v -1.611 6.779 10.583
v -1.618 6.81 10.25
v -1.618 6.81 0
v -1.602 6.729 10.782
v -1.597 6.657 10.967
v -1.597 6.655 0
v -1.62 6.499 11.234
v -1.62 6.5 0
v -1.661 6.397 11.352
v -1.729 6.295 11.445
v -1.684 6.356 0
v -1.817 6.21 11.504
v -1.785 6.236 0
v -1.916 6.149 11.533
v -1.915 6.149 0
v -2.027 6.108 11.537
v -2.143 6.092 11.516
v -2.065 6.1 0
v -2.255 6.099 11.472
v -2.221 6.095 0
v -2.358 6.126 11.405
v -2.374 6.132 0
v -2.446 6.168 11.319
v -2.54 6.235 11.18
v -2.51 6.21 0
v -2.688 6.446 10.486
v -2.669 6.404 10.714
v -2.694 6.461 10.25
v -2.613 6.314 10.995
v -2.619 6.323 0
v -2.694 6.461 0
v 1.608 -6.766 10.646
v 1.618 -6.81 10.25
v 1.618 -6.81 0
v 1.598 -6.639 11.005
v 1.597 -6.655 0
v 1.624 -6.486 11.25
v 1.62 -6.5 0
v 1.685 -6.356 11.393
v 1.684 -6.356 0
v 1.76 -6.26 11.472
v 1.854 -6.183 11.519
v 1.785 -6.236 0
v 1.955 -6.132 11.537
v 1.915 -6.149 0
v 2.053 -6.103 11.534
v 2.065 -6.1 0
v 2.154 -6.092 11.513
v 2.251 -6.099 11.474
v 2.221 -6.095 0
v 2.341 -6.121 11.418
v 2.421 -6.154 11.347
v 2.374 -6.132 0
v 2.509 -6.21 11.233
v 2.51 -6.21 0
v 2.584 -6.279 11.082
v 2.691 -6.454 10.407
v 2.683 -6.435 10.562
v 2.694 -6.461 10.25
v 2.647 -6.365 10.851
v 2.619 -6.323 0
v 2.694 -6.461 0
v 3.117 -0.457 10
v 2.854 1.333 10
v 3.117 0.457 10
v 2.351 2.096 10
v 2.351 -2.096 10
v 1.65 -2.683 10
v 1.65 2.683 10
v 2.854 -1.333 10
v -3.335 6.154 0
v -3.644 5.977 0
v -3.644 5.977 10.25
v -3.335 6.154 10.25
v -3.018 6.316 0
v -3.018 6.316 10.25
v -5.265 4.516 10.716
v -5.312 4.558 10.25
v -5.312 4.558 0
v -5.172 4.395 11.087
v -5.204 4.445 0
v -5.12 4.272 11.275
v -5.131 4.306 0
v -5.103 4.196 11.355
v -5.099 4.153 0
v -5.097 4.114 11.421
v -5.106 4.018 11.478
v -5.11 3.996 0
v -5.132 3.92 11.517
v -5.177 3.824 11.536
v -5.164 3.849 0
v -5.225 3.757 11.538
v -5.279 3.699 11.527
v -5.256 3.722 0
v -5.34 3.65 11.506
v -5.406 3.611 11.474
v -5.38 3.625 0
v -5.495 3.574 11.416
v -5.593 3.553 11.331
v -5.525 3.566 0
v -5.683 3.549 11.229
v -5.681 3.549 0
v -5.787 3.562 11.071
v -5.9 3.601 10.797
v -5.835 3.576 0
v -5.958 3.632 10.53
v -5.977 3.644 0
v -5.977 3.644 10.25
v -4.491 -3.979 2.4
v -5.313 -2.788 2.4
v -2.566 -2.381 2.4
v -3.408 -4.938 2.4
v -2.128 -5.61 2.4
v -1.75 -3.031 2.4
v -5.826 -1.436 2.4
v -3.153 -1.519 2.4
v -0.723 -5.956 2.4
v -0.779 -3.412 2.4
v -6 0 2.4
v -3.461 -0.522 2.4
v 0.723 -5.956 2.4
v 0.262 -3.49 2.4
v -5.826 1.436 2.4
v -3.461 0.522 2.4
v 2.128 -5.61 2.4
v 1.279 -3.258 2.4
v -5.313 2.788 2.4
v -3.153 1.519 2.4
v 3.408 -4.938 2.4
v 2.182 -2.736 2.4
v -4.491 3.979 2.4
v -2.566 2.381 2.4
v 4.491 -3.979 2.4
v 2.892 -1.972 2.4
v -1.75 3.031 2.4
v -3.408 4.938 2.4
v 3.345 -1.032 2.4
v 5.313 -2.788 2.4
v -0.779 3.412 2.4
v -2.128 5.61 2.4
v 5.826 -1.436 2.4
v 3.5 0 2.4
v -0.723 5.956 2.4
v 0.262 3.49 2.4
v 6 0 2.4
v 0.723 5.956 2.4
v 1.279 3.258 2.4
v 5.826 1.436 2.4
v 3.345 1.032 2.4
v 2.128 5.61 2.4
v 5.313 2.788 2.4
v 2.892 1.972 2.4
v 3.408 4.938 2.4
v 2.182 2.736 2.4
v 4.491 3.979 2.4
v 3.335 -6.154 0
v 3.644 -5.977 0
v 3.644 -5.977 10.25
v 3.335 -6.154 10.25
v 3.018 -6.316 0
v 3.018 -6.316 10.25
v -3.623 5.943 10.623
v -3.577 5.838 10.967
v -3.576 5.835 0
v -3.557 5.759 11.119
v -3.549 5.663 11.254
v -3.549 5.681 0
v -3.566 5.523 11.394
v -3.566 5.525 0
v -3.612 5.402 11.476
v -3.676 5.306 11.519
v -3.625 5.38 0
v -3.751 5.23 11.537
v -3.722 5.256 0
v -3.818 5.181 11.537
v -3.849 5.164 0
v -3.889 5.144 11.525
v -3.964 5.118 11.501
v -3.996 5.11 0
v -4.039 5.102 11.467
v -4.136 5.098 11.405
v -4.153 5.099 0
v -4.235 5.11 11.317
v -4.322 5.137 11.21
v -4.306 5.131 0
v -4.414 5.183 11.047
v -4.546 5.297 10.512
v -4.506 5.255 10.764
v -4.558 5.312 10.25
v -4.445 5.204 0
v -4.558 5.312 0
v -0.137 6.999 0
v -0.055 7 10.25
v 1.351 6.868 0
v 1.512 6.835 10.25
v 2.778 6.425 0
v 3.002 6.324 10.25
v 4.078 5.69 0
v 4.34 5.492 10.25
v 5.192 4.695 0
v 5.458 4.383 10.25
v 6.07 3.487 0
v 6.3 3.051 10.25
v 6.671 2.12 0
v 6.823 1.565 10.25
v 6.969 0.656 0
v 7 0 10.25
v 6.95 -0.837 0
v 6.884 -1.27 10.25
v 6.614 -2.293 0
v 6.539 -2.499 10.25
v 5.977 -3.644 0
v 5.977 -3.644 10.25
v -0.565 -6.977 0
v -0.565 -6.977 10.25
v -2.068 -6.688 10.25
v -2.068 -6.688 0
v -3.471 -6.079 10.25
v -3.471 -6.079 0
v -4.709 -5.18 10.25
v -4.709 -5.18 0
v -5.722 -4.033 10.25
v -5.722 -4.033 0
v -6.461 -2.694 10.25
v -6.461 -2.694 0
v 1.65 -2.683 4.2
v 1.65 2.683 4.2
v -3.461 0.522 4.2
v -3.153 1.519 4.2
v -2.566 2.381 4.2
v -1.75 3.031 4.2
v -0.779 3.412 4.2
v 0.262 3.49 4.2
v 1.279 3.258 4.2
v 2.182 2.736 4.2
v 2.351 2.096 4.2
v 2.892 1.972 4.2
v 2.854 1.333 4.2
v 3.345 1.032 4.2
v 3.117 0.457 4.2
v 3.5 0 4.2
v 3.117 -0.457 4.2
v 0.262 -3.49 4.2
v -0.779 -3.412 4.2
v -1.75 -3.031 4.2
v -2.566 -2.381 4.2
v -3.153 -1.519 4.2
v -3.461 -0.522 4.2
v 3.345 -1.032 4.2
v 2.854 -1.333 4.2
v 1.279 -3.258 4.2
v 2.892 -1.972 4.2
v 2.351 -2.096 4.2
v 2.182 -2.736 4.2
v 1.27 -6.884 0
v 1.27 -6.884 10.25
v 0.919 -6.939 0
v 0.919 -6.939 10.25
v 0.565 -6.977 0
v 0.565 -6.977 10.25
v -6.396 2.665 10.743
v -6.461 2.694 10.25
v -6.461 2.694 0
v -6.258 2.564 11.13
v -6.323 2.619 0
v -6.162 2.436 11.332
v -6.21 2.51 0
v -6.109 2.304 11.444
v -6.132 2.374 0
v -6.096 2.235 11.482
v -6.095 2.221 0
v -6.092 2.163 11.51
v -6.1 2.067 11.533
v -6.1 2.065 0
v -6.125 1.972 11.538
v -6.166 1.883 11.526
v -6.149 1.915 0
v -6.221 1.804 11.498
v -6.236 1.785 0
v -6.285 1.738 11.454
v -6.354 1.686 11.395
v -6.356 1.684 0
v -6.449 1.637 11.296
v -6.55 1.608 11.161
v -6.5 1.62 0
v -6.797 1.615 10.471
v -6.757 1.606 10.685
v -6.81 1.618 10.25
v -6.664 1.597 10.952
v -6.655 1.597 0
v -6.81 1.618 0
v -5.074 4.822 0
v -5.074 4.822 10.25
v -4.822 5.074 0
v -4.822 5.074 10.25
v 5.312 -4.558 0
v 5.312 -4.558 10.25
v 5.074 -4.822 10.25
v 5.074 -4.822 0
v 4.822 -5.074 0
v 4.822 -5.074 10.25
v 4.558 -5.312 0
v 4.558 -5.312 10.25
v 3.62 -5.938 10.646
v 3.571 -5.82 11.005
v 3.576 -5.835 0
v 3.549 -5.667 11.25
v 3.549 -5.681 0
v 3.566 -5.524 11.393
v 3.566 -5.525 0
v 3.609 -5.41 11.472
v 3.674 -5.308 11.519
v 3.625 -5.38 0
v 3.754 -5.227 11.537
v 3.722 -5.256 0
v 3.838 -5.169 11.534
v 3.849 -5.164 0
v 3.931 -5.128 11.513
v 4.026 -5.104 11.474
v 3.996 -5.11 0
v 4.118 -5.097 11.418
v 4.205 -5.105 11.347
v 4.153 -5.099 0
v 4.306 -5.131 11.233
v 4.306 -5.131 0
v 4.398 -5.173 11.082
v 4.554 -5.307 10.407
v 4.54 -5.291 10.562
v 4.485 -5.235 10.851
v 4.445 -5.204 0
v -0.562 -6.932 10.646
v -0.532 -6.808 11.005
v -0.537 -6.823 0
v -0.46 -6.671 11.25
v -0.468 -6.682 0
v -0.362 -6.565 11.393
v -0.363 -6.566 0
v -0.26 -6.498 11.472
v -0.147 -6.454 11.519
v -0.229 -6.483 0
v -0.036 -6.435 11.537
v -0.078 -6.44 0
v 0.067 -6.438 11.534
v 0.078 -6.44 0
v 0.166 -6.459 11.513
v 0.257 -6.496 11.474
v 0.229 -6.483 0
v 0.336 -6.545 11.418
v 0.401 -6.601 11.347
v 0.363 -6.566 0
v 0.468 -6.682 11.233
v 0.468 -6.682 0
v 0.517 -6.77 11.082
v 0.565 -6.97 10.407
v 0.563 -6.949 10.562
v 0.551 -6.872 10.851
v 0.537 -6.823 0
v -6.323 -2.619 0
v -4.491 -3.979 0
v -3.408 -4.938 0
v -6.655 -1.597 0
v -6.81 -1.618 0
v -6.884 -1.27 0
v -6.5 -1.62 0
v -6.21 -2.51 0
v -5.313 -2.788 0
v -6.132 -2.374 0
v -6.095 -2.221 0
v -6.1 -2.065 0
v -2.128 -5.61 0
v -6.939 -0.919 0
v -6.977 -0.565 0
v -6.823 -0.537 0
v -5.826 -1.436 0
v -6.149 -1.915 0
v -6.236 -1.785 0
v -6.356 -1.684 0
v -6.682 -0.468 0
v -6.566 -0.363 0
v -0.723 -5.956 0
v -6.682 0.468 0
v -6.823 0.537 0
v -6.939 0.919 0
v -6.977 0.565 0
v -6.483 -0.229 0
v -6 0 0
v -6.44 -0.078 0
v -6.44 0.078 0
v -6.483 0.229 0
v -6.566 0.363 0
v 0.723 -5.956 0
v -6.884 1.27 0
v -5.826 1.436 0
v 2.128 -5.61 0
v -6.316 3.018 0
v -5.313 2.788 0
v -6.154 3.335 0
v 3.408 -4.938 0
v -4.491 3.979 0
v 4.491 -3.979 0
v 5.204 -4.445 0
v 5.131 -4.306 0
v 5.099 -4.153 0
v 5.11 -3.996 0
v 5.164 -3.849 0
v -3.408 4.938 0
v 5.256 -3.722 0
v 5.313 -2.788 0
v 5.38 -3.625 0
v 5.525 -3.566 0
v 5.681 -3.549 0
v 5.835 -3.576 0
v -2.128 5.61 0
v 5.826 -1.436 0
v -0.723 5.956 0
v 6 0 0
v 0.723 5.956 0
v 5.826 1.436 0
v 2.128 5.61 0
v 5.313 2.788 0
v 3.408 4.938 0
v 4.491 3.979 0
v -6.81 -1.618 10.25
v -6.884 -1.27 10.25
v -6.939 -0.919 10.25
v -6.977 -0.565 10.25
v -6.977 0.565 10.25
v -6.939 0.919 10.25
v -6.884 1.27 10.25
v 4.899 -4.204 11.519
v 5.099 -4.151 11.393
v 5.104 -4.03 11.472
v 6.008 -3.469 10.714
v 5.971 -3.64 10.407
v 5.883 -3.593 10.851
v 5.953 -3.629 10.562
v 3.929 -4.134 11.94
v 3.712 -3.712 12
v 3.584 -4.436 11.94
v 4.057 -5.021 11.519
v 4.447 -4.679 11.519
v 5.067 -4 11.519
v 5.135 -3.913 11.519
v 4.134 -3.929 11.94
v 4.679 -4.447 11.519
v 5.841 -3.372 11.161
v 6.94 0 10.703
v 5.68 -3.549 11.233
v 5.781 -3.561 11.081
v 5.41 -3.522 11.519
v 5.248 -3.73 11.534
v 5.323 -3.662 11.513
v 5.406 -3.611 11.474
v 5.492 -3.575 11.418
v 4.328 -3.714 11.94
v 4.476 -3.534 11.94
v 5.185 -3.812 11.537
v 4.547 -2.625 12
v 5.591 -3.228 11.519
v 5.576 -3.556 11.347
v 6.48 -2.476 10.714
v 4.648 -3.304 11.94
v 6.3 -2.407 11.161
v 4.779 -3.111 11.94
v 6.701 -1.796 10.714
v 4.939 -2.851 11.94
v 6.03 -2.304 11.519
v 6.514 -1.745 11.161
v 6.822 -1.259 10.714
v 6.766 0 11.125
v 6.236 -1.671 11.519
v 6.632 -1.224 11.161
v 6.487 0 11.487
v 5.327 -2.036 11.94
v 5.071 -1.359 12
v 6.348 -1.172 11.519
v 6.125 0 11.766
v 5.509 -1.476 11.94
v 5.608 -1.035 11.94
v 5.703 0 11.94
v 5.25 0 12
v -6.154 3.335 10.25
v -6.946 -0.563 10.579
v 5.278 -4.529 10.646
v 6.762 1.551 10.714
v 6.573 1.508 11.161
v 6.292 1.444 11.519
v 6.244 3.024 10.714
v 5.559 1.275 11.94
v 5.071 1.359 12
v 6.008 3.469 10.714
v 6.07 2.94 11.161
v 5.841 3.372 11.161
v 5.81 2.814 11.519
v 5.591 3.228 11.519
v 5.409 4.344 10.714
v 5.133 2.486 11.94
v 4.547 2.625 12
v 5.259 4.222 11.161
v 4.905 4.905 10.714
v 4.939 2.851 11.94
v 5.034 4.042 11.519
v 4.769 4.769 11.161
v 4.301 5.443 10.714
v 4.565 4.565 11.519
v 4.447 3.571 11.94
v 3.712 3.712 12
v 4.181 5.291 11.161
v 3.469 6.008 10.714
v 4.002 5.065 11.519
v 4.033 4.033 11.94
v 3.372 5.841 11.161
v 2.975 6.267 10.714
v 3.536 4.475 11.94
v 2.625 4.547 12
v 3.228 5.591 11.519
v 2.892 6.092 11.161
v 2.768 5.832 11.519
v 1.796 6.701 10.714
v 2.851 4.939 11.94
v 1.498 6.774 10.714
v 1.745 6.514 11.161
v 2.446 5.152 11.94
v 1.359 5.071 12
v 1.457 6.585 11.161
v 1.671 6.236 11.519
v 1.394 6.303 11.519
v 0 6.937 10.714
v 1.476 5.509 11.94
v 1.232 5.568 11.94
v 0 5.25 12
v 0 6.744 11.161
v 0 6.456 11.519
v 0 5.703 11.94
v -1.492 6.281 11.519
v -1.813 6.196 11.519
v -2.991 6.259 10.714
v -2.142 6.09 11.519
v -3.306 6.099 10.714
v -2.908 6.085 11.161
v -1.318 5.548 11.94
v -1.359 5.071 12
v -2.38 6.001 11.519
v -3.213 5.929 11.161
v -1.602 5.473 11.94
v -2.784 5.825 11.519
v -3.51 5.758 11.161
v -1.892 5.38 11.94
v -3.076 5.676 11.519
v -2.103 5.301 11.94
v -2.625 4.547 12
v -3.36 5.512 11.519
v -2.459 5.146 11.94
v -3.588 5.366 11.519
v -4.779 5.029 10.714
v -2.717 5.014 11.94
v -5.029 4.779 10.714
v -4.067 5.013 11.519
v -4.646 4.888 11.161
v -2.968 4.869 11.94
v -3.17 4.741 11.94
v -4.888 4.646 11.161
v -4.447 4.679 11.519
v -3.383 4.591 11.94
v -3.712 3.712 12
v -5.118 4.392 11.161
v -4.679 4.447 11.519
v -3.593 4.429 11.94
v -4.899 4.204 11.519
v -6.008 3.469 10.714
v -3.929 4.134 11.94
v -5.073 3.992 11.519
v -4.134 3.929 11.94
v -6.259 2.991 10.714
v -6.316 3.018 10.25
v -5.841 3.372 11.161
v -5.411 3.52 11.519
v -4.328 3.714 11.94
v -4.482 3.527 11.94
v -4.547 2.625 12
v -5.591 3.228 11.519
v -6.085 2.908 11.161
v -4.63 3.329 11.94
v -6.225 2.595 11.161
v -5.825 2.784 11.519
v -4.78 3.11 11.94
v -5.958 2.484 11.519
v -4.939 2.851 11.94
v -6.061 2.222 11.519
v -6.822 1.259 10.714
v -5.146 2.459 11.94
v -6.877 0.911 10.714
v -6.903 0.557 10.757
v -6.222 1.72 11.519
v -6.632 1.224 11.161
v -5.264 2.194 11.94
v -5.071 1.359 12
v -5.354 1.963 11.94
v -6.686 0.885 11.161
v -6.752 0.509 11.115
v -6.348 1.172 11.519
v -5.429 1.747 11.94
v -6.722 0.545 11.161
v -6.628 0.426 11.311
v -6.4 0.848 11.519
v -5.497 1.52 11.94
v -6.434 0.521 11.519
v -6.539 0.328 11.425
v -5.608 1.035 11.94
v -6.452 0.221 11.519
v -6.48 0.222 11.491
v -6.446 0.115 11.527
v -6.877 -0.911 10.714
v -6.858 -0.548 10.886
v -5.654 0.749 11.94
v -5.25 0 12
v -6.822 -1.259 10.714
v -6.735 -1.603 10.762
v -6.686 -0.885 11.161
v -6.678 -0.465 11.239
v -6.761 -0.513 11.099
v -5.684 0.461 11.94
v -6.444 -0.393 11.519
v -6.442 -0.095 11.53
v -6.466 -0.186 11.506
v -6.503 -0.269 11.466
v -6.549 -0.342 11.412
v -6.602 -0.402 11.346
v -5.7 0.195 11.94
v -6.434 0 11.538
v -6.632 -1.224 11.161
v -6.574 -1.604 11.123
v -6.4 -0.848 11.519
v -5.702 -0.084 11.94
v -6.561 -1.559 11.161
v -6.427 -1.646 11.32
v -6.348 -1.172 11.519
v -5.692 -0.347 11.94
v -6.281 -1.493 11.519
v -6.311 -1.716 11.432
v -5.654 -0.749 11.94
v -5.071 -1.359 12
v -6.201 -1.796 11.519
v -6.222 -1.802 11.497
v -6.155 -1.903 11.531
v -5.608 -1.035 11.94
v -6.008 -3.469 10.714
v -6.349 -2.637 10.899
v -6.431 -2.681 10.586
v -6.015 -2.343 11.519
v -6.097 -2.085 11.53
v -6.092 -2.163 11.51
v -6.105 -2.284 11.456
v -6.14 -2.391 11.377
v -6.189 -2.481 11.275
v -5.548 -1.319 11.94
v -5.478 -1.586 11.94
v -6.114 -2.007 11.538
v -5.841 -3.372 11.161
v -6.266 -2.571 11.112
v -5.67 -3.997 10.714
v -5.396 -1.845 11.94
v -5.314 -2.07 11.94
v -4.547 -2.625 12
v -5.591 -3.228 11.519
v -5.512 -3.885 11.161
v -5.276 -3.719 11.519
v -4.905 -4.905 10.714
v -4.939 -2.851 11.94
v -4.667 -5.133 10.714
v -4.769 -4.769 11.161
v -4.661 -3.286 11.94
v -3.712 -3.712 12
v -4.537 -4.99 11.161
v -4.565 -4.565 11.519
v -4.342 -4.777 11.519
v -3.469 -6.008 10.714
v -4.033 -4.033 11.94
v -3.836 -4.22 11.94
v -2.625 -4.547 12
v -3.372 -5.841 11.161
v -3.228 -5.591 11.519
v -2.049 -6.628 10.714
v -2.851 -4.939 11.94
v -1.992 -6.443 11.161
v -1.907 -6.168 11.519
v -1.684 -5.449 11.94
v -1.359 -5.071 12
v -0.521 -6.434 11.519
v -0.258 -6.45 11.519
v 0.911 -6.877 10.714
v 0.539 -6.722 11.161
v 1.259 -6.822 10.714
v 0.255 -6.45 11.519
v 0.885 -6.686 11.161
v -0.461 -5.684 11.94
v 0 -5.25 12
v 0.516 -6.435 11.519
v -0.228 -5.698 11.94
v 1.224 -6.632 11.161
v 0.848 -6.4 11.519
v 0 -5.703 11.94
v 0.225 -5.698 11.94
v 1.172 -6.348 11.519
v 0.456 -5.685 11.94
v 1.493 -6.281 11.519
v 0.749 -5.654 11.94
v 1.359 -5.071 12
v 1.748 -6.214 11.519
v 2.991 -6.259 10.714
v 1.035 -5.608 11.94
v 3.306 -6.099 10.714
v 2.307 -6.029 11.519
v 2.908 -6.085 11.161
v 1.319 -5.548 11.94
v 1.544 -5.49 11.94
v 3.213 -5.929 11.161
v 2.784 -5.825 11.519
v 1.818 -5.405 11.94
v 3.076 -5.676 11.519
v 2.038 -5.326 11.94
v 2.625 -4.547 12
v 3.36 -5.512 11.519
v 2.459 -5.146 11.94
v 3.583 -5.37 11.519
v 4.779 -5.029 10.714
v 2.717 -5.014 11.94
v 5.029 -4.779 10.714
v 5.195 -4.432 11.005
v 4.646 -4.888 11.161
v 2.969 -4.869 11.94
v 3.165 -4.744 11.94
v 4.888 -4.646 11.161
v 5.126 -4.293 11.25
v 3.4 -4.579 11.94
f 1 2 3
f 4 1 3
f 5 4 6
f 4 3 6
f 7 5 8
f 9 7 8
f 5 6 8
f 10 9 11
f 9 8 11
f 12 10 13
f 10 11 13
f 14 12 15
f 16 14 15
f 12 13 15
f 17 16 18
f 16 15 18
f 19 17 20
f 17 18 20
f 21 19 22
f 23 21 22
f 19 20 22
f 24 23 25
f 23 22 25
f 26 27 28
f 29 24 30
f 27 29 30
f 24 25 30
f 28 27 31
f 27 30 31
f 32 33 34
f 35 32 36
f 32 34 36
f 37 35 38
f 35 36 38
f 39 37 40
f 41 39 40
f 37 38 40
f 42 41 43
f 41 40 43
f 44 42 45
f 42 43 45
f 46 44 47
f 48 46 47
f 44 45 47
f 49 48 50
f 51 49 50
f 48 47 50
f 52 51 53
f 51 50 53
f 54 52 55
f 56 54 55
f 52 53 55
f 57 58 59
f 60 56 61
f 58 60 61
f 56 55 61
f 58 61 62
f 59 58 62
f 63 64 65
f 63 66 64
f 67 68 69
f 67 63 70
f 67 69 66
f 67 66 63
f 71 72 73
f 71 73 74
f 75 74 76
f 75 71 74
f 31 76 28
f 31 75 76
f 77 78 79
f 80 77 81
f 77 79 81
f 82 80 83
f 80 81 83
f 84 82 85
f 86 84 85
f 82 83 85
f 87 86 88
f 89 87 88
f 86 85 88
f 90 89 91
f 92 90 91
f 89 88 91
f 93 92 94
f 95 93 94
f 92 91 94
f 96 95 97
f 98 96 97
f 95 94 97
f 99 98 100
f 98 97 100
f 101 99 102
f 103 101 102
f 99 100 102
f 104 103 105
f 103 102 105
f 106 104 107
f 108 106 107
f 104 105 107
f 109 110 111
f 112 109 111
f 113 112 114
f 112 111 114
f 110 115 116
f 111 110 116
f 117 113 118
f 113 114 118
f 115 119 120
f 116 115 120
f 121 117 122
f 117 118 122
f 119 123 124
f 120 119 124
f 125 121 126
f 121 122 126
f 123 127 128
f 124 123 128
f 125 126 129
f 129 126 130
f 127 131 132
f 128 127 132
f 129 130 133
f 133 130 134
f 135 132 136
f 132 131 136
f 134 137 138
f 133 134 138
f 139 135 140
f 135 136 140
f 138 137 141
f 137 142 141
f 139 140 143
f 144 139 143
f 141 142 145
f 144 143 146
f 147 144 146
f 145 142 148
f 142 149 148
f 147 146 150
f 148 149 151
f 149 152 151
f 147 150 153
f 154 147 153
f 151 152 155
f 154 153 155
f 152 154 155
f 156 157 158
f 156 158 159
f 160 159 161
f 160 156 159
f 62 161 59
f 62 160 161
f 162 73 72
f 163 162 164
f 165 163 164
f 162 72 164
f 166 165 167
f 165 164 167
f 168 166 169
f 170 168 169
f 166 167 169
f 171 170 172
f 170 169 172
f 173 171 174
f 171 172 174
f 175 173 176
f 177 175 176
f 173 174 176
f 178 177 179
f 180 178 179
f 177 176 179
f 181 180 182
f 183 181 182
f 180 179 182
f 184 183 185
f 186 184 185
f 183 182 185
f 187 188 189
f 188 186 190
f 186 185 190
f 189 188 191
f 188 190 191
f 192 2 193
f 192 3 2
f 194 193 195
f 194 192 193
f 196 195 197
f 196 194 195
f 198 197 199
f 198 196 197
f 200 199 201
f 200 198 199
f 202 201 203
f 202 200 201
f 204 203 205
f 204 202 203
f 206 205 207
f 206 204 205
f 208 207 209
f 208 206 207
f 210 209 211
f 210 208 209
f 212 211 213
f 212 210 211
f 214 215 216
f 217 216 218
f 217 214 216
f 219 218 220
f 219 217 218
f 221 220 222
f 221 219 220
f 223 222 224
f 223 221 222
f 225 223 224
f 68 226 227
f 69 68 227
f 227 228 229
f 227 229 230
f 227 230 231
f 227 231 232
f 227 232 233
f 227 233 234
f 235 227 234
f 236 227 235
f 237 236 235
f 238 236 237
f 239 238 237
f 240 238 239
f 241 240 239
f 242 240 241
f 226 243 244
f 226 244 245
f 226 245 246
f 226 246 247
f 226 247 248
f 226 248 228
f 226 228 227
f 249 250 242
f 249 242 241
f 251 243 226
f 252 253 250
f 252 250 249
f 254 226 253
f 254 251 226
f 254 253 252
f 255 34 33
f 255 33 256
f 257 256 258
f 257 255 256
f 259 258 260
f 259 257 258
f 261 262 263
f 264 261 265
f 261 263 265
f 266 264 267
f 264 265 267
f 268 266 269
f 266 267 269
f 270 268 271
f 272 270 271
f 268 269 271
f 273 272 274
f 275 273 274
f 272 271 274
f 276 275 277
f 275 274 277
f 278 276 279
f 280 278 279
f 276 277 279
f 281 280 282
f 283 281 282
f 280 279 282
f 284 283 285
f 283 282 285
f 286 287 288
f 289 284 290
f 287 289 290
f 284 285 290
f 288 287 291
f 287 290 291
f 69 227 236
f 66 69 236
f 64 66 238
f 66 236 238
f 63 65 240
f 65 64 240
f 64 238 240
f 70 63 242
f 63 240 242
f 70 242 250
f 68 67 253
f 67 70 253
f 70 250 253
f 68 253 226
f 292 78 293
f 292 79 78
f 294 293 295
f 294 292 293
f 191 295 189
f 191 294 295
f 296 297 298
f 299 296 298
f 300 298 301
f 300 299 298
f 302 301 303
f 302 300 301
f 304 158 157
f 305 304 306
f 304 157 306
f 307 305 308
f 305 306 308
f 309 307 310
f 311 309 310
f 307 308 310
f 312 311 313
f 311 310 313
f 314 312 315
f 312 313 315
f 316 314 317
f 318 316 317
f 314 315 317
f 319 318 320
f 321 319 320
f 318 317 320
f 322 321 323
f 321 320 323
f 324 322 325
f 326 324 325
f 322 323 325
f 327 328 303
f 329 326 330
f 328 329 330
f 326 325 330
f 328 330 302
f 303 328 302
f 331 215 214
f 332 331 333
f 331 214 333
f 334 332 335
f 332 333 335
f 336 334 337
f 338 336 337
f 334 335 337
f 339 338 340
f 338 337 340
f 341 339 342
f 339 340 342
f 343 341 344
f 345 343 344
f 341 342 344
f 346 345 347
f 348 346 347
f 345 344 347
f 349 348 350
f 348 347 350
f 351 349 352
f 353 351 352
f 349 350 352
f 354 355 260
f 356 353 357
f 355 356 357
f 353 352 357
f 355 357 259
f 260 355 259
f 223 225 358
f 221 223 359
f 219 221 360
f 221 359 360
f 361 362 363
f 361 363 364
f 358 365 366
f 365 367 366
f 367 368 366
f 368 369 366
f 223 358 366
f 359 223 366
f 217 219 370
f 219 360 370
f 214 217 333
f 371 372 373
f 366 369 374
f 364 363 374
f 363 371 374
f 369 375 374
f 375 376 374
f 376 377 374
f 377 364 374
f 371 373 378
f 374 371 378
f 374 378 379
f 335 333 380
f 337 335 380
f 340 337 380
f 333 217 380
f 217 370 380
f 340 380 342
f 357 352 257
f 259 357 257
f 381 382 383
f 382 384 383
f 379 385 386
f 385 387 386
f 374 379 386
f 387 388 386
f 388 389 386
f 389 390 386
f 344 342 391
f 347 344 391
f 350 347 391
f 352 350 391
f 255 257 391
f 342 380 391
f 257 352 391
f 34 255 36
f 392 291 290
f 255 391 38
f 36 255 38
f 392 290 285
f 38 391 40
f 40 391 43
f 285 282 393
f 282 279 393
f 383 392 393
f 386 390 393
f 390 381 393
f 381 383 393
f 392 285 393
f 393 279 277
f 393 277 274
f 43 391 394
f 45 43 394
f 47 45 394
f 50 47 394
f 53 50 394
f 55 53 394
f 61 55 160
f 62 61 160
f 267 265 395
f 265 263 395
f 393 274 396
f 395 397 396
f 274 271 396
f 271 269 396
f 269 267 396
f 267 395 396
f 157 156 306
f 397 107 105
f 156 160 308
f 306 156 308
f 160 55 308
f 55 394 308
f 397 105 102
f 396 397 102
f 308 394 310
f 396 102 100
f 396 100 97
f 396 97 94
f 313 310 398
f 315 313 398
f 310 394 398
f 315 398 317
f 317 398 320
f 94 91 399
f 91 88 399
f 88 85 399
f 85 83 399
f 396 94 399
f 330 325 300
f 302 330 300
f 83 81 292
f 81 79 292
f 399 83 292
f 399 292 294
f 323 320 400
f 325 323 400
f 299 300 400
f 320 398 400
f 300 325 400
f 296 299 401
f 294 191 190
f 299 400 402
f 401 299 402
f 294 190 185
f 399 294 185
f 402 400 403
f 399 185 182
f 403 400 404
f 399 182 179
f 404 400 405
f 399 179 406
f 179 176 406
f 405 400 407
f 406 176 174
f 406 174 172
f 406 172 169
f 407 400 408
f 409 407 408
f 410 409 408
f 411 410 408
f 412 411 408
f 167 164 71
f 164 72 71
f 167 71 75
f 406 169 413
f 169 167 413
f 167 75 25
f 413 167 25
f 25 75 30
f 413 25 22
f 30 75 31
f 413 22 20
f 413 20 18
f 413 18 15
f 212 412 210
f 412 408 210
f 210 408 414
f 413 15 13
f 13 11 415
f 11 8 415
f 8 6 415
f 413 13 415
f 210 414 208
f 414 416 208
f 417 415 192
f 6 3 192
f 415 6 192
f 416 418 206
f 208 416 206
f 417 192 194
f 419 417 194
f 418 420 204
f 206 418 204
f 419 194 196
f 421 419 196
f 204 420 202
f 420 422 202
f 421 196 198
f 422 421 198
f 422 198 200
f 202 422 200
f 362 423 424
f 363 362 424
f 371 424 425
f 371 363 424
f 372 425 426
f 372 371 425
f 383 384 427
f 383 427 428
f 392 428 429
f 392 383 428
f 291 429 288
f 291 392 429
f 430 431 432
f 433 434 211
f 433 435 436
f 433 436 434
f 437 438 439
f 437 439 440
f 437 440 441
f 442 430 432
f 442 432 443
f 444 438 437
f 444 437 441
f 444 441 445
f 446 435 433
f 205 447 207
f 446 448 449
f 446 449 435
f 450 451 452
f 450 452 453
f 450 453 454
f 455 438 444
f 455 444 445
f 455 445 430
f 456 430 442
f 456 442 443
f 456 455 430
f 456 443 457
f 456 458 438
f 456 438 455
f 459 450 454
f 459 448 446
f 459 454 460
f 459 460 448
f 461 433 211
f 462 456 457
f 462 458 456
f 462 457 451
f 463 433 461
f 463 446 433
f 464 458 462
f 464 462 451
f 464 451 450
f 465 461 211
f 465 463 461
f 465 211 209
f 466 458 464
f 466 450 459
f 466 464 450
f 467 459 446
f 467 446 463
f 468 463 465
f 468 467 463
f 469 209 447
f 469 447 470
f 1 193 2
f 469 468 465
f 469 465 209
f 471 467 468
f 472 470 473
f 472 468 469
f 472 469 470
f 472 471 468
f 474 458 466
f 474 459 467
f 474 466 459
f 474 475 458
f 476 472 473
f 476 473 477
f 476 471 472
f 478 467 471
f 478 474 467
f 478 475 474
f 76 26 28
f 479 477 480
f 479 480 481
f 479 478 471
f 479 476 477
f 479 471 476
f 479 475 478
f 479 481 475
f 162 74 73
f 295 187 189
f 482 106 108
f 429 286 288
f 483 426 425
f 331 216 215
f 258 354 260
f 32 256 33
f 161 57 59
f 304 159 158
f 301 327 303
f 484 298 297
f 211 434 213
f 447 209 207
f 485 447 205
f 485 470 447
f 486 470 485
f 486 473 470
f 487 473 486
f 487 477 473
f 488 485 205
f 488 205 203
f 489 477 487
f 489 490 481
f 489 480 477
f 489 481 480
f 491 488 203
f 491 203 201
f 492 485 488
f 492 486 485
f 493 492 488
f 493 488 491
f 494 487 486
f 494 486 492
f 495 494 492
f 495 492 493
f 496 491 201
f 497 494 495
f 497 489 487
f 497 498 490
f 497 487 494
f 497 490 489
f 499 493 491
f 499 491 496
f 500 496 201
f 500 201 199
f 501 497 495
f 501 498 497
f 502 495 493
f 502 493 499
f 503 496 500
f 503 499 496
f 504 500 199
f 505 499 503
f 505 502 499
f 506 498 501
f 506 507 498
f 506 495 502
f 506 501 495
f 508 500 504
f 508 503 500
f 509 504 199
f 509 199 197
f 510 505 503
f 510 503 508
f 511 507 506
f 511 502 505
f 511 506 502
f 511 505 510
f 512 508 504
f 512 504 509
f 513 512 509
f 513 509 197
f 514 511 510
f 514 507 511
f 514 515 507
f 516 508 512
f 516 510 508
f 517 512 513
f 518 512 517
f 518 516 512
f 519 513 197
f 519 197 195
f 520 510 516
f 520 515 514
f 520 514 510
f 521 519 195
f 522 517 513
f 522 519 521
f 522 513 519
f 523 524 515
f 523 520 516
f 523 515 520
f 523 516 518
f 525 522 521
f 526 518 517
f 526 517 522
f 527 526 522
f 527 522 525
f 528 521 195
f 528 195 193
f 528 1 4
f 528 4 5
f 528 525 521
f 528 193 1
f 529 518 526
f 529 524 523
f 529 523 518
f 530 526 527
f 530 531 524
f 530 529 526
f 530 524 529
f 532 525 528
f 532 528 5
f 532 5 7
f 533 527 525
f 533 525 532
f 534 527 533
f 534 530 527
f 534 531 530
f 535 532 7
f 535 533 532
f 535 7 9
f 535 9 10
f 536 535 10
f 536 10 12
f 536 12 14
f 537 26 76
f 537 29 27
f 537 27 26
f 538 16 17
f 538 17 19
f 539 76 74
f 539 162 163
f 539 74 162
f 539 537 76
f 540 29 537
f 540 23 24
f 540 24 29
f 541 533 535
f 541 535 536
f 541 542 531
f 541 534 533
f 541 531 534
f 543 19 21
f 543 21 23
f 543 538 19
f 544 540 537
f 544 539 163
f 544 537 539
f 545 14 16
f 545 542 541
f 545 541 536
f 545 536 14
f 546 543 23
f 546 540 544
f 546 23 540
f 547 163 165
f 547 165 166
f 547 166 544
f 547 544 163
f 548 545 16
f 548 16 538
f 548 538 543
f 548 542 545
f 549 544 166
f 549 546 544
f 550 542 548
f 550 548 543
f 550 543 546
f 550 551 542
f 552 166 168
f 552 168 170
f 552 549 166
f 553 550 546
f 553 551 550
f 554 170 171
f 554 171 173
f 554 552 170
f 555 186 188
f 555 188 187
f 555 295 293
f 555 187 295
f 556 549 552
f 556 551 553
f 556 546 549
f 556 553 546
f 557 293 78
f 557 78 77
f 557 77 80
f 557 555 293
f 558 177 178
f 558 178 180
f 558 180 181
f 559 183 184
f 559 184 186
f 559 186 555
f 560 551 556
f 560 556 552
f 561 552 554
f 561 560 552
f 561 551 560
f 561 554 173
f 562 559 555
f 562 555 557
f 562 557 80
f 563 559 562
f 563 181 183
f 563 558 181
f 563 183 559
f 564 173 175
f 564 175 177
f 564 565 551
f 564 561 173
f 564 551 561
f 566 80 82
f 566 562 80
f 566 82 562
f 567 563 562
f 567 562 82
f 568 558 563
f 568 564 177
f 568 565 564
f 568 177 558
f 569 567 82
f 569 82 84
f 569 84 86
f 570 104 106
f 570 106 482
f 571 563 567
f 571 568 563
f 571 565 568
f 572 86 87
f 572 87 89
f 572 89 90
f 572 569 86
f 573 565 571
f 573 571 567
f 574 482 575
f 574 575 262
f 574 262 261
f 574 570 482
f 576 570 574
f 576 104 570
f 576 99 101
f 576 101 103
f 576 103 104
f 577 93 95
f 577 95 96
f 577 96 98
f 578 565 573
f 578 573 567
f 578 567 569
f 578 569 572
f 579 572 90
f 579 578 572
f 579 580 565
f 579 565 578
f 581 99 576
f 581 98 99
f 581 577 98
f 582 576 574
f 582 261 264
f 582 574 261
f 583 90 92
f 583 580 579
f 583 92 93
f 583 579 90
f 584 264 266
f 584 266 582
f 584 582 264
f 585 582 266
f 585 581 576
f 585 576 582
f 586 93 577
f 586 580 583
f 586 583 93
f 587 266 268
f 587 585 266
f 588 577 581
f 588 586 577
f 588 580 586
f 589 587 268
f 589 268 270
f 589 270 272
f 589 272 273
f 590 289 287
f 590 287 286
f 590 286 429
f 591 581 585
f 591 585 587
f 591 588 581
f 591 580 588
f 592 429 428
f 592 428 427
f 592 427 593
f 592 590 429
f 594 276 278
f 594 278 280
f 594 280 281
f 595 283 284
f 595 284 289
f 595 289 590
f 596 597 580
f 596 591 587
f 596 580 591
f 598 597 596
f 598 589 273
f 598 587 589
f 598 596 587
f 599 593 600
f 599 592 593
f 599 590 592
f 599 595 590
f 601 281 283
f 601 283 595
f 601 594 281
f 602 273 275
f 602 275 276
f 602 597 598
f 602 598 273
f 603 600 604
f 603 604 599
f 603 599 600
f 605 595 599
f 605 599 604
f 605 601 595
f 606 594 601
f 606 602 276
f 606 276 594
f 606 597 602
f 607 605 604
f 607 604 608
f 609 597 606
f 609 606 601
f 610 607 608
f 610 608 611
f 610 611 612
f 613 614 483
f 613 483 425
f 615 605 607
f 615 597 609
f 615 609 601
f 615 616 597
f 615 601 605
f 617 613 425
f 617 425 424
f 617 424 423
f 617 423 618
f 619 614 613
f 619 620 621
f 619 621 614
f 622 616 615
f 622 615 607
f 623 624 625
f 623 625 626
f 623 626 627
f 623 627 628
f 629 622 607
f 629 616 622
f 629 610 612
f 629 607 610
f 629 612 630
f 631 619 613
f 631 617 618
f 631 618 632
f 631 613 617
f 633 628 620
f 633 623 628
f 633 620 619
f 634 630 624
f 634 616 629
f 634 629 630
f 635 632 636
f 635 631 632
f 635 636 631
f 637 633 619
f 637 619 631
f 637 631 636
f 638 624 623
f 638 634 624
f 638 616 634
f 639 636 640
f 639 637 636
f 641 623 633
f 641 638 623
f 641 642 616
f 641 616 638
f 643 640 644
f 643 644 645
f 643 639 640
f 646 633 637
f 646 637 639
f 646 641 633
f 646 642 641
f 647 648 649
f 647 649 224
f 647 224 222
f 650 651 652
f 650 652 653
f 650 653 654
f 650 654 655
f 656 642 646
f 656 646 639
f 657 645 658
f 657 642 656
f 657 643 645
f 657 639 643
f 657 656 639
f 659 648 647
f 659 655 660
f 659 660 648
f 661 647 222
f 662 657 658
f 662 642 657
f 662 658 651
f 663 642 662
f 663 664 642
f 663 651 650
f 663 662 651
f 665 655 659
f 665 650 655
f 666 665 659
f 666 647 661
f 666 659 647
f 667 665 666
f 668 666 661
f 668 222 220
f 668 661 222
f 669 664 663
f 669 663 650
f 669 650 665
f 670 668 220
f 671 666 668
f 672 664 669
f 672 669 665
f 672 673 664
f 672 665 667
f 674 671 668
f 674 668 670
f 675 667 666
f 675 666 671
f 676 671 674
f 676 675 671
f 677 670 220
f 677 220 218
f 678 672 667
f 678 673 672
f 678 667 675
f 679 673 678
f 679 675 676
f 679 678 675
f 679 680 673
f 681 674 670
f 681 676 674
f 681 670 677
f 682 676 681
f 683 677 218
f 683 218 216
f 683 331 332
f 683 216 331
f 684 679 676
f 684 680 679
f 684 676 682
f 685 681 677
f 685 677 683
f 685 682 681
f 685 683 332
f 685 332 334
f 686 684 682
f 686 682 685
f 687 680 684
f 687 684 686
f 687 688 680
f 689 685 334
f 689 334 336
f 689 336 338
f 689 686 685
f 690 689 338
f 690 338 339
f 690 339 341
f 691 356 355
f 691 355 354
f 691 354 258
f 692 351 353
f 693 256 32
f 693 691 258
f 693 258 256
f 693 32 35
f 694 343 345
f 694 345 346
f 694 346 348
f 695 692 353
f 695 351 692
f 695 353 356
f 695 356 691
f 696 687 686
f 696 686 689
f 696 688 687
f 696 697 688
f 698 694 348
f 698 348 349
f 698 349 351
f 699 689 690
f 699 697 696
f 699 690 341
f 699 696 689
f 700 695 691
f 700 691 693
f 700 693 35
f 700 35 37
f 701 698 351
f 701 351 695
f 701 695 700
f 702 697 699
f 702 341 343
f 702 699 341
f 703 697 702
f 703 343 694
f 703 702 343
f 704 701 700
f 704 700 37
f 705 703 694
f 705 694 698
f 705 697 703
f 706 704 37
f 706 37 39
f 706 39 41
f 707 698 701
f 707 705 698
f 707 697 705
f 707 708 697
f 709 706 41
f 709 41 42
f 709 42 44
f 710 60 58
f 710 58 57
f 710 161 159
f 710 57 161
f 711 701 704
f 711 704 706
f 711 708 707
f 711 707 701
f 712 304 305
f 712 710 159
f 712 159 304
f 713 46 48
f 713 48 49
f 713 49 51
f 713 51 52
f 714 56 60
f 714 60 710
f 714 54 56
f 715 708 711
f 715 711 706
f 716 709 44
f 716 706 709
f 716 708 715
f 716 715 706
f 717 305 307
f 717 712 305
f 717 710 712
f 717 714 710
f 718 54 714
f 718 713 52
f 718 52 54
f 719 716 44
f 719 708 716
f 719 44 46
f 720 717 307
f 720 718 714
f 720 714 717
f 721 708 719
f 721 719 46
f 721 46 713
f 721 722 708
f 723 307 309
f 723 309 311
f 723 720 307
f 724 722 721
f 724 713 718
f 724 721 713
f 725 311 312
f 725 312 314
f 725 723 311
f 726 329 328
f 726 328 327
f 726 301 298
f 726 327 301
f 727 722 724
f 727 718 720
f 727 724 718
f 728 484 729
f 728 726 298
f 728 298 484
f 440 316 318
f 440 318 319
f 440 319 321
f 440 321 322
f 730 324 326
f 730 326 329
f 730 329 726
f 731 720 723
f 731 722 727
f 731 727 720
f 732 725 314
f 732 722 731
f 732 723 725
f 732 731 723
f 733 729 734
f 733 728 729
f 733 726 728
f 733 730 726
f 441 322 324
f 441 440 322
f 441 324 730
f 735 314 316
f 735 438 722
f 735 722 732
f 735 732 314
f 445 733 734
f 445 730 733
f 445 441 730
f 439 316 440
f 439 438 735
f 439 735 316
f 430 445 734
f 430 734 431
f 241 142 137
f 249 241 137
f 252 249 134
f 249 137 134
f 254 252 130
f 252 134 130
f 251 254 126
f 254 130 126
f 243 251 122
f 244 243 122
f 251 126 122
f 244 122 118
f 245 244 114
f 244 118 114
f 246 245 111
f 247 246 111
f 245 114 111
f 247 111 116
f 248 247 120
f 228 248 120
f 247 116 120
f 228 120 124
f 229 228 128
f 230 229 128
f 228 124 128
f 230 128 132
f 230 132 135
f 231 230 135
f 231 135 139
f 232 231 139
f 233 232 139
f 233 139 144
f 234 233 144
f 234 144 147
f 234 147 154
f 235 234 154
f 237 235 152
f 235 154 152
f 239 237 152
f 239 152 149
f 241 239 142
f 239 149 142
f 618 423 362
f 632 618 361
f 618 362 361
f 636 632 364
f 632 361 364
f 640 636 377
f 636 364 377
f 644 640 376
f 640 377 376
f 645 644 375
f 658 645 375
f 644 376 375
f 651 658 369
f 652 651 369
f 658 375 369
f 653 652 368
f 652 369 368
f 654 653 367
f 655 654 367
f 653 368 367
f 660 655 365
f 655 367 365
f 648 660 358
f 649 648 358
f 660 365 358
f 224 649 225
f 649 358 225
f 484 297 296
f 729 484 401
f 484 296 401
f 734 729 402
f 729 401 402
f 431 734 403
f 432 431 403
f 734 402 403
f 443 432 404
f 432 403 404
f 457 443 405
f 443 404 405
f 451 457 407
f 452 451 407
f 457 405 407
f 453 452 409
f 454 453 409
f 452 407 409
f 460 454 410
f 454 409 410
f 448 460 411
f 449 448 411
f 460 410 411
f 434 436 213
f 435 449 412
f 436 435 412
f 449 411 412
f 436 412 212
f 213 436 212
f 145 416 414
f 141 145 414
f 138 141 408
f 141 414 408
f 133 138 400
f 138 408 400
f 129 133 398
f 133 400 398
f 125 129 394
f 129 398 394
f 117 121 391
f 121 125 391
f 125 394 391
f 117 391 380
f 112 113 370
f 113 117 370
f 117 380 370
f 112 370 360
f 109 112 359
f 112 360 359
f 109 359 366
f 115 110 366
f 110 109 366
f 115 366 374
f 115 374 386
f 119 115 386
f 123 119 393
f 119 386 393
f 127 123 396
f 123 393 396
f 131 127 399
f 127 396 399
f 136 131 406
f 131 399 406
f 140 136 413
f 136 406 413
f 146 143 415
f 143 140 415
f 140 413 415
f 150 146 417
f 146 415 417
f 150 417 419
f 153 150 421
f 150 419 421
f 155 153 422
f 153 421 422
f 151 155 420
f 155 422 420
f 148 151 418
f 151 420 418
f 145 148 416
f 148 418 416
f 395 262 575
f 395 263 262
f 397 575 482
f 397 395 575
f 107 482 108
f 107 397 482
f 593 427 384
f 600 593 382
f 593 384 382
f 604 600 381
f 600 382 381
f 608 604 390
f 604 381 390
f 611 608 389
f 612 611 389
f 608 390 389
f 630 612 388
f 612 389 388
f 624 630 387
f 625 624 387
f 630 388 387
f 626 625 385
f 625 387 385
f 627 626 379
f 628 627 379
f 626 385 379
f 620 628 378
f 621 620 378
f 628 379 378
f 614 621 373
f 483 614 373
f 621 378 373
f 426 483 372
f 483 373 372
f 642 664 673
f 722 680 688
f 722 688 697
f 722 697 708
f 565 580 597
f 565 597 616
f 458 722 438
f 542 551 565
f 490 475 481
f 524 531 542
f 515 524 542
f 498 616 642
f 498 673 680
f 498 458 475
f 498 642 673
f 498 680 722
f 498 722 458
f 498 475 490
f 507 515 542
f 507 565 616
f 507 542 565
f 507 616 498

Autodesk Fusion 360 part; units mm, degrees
sketch "Sketch1" plane through (0, 0, 0) normal (0, 0, 1) x (1, 0, 0)
  circle A0 centre (0, 0) radius 7
  dimension "d1" = 14
extrude "Extrude1" add sketch "Sketch1" along normal blind 12
fillet "Fillet1" radius 1.75 1 edges at (-6.5263, -2.5313, 12)
sketch "Sketch2" plane through (0, 0, 0) normal (0, 0, -1) x (1, 0, 0)
  circle A0 centre (0, 0) radius 7
  circle A1 centre (0, 0) radius 7
  circle A2 centre (0, 0) radius 6
  circle A3 centre (0, 0) radius 7
  line L0 (0, 0) -> (0, 0.2) construction
  line L1 (0, 0.2) -> (0, 7) construction
  line L2 (0, 6) -> (0.65, 6) construction
  line L3 (0, 7) -> (0.6591, 6.9689) construction
  line L4 (0.65, 6) -> (0.65, 6.9845) construction
  line L5 (0.65, 6.4922) -> (0, 6.4922) construction
  circle A4 centre (0, 7) radius 0.5657
  circle A5 centre (-2.1631, 6.6574) radius 0.5657
  circle A6 centre (-4.1145, 5.6631) radius 0.5657
  circle A7 centre (-5.6631, 4.1145) radius 0.5657
  circle A8 centre (-6.6574, 2.1631) radius 0.5657
  circle A9 centre (-7, 0) radius 0.5657
  circle A10 centre (-6.6574, -2.1631) radius 0.5657
  circle A11 centre (-5.6631, -4.1145) radius 0.5657
  circle A12 centre (-4.1145, -5.6631) radius 0.5657
  circle A13 centre (-2.1631, -6.6574) radius 0.5657
  circle A14 centre (0, -7) radius 0.5657
  circle A15 centre (2.1631, -6.6574) radius 0.5657
  circle A16 centre (4.1145, -5.6631) radius 0.5657
  circle A17 centre (5.6631, -4.1145) radius 0.5657
  circle A18 centre (6.6574, -2.1631) radius 0.5657
  circle A19 centre (7, 0) radius 0.5657
  circle A20 centre (6.6574, 2.1631) radius 0.5657
  circle A21 centre (5.6631, 4.1145) radius 0.5657
  circle A22 centre (4.1145, 5.6631) radius 0.5657
  circle A23 centre (2.1631, 6.6574) radius 0.5657
  dimension "d6" = 1
  dimension "d8" = 360
extrude "Extrude2" cut sketch "Sketch2" against normal up to surface (12 mm away) contours A0 A1 A3 A19 | A0 A1 A3 A20 | A0 A1 A3 A18 | A0 A1 A3 A21 | A0 A1 A3 A17 | A0 A1 A3 A22 | A0 A1 A3 A16 | A0 A1 A3 A23 | A0 A1 A3 A15 | A0 A1 A3 A4 | A0 A1 A3 A14 | A0 A1 A3 A5 | A0 A1 A3 A13 | A0 A1 A3 A6 | A0 A1 A3 A12 | A0 A1 A3 A7 | A0 A1 A3 A11 | A0 A1 A3 A8 | A0 A1 A3 A10 | A0 A1 A3 A9 picked at (7.1797, -0.1173) picked at (6.8361, 2.2176) picked at (6.8361, -2.2176) picked at (5.5015, 4.0141) picked at (5.8177, -4.2195) picked at (4.0141, 5.5015) picked at (4.2165, -5.8197) picked at (2.0914, 6.4812) picked at (2.2148, -6.837) picked at (-0.0137, 6.8102) picked at (-0.0038, -7.1868) picked at (-2.2209, 6.8351) picked at (-2.1158, -6.4731) picked at (-4.2243, 5.8143) picked at (-3.9923, -5.5173) picked at (-5.8143, 4.2243) picked at (-5.5036, -4.0109) picked at (-6.4748, 2.1098) picked at (-6.4748, -2.1098) picked at (-6.8097, 0)
sketch "Sketch3" plane through (0, 0, 0) normal (0, 0, 1) x (1, 0, 0)
  circle A0 centre (0, 0) radius 6
  dimension "d11" = 12
extrude "Extrude3" cut sketch "Sketch3" along normal blind 2.4
sketch "Sketch4" plane through (0, 0, 2.4) normal (0, 0, -1) x (1, 0, 0)
  circle A0 centre (0, 0) radius 6
  circle A1 centre (0, 0) radius 3.5
  dimension "d14" = 7
extrude "Extrude4" cut sketch "Sketch4" against normal blind 1.8 contours A1
sketch "Sketch5" plane through (0, 0, 4.2) normal (0, 0, -1) x (1, 0, 0)
  circle A0 centre (0, 0) radius 3.5
  circle A1 centre (0, 0) radius 3.5
  circle A2 centre (0, 0) radius 3.15
  line L0 (1.65, 4.5) -> (1.65, -4.3)
  line L1 (3.15, 4.1) -> (3.15, -3.8) construction
  dimension "d17" = 6.3
  dimension "d18" = 1.5
extrude "Extrude5" cut sketch "Sketch5" against normal up to surface (5.8 mm away) contours A2 L0 picked at (1.774, -0.8051)
